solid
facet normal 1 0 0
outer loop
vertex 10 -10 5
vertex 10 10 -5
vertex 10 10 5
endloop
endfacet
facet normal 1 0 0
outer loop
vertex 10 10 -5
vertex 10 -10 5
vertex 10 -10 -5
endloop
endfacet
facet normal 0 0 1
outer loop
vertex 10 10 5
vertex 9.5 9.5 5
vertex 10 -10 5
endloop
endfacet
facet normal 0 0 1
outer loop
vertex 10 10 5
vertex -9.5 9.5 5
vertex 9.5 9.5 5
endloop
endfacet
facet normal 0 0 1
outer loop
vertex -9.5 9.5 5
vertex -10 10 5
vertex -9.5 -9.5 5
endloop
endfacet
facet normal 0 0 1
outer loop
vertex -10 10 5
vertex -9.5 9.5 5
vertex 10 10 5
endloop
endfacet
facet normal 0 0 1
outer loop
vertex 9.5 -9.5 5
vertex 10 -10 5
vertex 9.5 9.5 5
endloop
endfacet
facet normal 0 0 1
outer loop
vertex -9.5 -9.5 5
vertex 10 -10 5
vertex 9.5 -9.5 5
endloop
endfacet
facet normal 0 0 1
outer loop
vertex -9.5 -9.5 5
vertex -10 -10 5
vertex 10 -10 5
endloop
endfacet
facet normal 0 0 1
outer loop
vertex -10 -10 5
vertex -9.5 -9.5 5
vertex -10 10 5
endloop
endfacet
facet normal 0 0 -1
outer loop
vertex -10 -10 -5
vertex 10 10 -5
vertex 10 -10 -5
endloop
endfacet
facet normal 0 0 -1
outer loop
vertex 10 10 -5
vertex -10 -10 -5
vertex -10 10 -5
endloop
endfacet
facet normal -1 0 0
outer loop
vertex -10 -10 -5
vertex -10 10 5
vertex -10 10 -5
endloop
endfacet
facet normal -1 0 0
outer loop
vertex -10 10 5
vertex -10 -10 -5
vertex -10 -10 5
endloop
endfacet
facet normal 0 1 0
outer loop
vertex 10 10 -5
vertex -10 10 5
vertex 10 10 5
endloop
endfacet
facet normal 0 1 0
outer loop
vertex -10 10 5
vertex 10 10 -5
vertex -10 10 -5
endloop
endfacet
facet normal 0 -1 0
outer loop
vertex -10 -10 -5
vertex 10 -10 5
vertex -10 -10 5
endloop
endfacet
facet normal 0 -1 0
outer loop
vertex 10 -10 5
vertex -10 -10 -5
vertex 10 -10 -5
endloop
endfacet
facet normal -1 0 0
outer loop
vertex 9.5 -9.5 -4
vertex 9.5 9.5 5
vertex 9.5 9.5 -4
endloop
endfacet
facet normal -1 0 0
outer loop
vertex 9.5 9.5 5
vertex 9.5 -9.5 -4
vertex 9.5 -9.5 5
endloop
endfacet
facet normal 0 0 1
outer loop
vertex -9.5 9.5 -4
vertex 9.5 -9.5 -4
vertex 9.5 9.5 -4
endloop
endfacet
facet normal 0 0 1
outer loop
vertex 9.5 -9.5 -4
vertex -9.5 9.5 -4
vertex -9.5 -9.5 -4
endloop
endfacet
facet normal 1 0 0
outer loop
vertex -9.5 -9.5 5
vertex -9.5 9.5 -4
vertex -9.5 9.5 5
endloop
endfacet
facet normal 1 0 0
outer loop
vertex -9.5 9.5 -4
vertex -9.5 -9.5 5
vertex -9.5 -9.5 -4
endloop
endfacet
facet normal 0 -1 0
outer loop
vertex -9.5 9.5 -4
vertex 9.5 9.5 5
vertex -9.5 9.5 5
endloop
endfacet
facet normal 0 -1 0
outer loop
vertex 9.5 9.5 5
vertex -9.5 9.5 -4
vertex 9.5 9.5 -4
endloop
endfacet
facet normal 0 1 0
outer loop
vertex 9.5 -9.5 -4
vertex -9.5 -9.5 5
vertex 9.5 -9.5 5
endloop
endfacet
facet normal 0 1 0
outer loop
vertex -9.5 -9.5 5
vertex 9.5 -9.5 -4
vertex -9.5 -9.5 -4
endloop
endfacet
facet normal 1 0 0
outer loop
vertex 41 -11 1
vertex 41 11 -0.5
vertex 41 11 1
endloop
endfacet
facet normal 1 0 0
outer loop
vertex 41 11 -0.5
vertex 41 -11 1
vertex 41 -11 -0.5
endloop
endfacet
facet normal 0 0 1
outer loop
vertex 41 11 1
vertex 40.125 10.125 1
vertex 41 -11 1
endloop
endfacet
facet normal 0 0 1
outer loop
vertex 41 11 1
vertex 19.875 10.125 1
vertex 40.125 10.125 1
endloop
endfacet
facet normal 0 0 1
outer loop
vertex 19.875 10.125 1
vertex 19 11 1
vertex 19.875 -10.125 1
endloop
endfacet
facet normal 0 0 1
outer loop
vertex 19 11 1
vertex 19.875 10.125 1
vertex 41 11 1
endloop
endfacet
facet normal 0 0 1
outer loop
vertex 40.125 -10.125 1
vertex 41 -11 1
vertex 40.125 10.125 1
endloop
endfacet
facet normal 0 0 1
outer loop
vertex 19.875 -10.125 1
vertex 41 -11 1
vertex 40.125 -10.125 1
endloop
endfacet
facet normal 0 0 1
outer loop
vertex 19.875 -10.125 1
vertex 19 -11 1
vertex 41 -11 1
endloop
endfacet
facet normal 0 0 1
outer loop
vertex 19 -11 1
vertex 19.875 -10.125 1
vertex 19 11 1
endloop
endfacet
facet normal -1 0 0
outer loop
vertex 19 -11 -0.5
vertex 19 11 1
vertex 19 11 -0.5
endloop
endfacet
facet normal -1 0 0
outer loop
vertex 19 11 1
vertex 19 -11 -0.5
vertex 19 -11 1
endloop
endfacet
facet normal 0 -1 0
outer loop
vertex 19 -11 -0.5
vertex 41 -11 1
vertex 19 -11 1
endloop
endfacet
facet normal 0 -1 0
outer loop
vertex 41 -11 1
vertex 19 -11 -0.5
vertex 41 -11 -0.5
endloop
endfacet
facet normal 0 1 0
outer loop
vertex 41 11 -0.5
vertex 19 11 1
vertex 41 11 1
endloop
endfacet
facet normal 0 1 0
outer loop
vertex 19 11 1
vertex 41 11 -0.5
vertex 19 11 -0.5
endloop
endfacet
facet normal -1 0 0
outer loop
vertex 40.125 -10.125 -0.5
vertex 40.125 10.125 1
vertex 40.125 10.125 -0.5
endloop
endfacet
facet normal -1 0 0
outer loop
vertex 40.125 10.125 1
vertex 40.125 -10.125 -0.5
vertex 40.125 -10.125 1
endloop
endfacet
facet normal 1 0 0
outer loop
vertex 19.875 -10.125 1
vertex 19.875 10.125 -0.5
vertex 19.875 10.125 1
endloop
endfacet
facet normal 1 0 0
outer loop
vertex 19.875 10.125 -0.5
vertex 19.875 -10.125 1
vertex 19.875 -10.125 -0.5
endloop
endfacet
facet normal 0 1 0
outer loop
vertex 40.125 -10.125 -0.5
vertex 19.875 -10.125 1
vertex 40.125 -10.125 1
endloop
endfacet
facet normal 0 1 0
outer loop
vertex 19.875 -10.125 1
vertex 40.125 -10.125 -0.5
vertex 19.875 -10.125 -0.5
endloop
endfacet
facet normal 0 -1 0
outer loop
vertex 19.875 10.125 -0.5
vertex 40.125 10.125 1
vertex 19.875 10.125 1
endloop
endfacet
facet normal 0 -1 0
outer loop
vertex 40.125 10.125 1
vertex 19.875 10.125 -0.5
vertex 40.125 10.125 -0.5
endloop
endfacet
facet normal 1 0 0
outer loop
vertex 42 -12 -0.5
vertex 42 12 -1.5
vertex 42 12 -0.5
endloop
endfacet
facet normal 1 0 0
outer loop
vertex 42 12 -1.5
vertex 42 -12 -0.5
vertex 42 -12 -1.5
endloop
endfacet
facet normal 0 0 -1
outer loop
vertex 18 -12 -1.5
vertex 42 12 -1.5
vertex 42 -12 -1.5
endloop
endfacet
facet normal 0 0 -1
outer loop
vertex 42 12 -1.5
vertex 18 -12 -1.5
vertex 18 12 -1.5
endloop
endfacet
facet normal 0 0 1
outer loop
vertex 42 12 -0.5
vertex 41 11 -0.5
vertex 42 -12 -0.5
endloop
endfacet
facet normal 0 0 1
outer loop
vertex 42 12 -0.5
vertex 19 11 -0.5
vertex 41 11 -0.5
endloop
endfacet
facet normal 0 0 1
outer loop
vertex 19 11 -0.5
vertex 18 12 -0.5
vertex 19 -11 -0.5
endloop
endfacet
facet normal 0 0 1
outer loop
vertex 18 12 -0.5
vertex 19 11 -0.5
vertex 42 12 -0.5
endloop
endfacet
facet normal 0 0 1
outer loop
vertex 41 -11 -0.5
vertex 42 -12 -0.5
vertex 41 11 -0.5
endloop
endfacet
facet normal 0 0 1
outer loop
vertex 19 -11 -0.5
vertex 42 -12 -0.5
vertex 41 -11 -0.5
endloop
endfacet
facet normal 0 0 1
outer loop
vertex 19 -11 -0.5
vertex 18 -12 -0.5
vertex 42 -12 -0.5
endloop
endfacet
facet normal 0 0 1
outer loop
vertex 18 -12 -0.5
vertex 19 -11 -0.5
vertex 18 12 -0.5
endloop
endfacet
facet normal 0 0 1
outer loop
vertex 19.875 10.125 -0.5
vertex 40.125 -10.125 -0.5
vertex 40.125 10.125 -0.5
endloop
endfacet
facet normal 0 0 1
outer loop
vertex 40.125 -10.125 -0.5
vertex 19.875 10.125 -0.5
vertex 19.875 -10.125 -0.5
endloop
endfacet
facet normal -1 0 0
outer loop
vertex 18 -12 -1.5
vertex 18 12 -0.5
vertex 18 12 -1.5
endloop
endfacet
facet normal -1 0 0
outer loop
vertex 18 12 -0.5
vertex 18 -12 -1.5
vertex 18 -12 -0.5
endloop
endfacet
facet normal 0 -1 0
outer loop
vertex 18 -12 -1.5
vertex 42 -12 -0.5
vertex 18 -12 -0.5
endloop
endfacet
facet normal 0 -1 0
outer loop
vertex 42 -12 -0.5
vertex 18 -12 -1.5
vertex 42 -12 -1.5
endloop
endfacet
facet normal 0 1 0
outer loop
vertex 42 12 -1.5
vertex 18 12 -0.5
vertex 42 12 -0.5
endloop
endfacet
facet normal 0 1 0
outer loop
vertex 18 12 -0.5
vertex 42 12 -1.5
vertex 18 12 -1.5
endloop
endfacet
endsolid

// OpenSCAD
union() {
    difference() {
        cube(size=[20.0, 20.0, 10.0], center=true);
        translate([0.00,0.00,1.00]) cube(size=[19.0, 19.0, 10.0], center=true);
    }

    translate([30.00,0.00,0.00]) rotate([180, 0, 0]) union() {
        translate([0.00,0.00,1.00]) cube(size=[24.0, 24.0, 1.0], center=true);
        color("red", 0.5) difference() {
            cube(size=[22.0, 22.0, 2.0], center=true);
            cube(size=[20.25, 20.25, 4.0], center=true);
        }

    }

}
